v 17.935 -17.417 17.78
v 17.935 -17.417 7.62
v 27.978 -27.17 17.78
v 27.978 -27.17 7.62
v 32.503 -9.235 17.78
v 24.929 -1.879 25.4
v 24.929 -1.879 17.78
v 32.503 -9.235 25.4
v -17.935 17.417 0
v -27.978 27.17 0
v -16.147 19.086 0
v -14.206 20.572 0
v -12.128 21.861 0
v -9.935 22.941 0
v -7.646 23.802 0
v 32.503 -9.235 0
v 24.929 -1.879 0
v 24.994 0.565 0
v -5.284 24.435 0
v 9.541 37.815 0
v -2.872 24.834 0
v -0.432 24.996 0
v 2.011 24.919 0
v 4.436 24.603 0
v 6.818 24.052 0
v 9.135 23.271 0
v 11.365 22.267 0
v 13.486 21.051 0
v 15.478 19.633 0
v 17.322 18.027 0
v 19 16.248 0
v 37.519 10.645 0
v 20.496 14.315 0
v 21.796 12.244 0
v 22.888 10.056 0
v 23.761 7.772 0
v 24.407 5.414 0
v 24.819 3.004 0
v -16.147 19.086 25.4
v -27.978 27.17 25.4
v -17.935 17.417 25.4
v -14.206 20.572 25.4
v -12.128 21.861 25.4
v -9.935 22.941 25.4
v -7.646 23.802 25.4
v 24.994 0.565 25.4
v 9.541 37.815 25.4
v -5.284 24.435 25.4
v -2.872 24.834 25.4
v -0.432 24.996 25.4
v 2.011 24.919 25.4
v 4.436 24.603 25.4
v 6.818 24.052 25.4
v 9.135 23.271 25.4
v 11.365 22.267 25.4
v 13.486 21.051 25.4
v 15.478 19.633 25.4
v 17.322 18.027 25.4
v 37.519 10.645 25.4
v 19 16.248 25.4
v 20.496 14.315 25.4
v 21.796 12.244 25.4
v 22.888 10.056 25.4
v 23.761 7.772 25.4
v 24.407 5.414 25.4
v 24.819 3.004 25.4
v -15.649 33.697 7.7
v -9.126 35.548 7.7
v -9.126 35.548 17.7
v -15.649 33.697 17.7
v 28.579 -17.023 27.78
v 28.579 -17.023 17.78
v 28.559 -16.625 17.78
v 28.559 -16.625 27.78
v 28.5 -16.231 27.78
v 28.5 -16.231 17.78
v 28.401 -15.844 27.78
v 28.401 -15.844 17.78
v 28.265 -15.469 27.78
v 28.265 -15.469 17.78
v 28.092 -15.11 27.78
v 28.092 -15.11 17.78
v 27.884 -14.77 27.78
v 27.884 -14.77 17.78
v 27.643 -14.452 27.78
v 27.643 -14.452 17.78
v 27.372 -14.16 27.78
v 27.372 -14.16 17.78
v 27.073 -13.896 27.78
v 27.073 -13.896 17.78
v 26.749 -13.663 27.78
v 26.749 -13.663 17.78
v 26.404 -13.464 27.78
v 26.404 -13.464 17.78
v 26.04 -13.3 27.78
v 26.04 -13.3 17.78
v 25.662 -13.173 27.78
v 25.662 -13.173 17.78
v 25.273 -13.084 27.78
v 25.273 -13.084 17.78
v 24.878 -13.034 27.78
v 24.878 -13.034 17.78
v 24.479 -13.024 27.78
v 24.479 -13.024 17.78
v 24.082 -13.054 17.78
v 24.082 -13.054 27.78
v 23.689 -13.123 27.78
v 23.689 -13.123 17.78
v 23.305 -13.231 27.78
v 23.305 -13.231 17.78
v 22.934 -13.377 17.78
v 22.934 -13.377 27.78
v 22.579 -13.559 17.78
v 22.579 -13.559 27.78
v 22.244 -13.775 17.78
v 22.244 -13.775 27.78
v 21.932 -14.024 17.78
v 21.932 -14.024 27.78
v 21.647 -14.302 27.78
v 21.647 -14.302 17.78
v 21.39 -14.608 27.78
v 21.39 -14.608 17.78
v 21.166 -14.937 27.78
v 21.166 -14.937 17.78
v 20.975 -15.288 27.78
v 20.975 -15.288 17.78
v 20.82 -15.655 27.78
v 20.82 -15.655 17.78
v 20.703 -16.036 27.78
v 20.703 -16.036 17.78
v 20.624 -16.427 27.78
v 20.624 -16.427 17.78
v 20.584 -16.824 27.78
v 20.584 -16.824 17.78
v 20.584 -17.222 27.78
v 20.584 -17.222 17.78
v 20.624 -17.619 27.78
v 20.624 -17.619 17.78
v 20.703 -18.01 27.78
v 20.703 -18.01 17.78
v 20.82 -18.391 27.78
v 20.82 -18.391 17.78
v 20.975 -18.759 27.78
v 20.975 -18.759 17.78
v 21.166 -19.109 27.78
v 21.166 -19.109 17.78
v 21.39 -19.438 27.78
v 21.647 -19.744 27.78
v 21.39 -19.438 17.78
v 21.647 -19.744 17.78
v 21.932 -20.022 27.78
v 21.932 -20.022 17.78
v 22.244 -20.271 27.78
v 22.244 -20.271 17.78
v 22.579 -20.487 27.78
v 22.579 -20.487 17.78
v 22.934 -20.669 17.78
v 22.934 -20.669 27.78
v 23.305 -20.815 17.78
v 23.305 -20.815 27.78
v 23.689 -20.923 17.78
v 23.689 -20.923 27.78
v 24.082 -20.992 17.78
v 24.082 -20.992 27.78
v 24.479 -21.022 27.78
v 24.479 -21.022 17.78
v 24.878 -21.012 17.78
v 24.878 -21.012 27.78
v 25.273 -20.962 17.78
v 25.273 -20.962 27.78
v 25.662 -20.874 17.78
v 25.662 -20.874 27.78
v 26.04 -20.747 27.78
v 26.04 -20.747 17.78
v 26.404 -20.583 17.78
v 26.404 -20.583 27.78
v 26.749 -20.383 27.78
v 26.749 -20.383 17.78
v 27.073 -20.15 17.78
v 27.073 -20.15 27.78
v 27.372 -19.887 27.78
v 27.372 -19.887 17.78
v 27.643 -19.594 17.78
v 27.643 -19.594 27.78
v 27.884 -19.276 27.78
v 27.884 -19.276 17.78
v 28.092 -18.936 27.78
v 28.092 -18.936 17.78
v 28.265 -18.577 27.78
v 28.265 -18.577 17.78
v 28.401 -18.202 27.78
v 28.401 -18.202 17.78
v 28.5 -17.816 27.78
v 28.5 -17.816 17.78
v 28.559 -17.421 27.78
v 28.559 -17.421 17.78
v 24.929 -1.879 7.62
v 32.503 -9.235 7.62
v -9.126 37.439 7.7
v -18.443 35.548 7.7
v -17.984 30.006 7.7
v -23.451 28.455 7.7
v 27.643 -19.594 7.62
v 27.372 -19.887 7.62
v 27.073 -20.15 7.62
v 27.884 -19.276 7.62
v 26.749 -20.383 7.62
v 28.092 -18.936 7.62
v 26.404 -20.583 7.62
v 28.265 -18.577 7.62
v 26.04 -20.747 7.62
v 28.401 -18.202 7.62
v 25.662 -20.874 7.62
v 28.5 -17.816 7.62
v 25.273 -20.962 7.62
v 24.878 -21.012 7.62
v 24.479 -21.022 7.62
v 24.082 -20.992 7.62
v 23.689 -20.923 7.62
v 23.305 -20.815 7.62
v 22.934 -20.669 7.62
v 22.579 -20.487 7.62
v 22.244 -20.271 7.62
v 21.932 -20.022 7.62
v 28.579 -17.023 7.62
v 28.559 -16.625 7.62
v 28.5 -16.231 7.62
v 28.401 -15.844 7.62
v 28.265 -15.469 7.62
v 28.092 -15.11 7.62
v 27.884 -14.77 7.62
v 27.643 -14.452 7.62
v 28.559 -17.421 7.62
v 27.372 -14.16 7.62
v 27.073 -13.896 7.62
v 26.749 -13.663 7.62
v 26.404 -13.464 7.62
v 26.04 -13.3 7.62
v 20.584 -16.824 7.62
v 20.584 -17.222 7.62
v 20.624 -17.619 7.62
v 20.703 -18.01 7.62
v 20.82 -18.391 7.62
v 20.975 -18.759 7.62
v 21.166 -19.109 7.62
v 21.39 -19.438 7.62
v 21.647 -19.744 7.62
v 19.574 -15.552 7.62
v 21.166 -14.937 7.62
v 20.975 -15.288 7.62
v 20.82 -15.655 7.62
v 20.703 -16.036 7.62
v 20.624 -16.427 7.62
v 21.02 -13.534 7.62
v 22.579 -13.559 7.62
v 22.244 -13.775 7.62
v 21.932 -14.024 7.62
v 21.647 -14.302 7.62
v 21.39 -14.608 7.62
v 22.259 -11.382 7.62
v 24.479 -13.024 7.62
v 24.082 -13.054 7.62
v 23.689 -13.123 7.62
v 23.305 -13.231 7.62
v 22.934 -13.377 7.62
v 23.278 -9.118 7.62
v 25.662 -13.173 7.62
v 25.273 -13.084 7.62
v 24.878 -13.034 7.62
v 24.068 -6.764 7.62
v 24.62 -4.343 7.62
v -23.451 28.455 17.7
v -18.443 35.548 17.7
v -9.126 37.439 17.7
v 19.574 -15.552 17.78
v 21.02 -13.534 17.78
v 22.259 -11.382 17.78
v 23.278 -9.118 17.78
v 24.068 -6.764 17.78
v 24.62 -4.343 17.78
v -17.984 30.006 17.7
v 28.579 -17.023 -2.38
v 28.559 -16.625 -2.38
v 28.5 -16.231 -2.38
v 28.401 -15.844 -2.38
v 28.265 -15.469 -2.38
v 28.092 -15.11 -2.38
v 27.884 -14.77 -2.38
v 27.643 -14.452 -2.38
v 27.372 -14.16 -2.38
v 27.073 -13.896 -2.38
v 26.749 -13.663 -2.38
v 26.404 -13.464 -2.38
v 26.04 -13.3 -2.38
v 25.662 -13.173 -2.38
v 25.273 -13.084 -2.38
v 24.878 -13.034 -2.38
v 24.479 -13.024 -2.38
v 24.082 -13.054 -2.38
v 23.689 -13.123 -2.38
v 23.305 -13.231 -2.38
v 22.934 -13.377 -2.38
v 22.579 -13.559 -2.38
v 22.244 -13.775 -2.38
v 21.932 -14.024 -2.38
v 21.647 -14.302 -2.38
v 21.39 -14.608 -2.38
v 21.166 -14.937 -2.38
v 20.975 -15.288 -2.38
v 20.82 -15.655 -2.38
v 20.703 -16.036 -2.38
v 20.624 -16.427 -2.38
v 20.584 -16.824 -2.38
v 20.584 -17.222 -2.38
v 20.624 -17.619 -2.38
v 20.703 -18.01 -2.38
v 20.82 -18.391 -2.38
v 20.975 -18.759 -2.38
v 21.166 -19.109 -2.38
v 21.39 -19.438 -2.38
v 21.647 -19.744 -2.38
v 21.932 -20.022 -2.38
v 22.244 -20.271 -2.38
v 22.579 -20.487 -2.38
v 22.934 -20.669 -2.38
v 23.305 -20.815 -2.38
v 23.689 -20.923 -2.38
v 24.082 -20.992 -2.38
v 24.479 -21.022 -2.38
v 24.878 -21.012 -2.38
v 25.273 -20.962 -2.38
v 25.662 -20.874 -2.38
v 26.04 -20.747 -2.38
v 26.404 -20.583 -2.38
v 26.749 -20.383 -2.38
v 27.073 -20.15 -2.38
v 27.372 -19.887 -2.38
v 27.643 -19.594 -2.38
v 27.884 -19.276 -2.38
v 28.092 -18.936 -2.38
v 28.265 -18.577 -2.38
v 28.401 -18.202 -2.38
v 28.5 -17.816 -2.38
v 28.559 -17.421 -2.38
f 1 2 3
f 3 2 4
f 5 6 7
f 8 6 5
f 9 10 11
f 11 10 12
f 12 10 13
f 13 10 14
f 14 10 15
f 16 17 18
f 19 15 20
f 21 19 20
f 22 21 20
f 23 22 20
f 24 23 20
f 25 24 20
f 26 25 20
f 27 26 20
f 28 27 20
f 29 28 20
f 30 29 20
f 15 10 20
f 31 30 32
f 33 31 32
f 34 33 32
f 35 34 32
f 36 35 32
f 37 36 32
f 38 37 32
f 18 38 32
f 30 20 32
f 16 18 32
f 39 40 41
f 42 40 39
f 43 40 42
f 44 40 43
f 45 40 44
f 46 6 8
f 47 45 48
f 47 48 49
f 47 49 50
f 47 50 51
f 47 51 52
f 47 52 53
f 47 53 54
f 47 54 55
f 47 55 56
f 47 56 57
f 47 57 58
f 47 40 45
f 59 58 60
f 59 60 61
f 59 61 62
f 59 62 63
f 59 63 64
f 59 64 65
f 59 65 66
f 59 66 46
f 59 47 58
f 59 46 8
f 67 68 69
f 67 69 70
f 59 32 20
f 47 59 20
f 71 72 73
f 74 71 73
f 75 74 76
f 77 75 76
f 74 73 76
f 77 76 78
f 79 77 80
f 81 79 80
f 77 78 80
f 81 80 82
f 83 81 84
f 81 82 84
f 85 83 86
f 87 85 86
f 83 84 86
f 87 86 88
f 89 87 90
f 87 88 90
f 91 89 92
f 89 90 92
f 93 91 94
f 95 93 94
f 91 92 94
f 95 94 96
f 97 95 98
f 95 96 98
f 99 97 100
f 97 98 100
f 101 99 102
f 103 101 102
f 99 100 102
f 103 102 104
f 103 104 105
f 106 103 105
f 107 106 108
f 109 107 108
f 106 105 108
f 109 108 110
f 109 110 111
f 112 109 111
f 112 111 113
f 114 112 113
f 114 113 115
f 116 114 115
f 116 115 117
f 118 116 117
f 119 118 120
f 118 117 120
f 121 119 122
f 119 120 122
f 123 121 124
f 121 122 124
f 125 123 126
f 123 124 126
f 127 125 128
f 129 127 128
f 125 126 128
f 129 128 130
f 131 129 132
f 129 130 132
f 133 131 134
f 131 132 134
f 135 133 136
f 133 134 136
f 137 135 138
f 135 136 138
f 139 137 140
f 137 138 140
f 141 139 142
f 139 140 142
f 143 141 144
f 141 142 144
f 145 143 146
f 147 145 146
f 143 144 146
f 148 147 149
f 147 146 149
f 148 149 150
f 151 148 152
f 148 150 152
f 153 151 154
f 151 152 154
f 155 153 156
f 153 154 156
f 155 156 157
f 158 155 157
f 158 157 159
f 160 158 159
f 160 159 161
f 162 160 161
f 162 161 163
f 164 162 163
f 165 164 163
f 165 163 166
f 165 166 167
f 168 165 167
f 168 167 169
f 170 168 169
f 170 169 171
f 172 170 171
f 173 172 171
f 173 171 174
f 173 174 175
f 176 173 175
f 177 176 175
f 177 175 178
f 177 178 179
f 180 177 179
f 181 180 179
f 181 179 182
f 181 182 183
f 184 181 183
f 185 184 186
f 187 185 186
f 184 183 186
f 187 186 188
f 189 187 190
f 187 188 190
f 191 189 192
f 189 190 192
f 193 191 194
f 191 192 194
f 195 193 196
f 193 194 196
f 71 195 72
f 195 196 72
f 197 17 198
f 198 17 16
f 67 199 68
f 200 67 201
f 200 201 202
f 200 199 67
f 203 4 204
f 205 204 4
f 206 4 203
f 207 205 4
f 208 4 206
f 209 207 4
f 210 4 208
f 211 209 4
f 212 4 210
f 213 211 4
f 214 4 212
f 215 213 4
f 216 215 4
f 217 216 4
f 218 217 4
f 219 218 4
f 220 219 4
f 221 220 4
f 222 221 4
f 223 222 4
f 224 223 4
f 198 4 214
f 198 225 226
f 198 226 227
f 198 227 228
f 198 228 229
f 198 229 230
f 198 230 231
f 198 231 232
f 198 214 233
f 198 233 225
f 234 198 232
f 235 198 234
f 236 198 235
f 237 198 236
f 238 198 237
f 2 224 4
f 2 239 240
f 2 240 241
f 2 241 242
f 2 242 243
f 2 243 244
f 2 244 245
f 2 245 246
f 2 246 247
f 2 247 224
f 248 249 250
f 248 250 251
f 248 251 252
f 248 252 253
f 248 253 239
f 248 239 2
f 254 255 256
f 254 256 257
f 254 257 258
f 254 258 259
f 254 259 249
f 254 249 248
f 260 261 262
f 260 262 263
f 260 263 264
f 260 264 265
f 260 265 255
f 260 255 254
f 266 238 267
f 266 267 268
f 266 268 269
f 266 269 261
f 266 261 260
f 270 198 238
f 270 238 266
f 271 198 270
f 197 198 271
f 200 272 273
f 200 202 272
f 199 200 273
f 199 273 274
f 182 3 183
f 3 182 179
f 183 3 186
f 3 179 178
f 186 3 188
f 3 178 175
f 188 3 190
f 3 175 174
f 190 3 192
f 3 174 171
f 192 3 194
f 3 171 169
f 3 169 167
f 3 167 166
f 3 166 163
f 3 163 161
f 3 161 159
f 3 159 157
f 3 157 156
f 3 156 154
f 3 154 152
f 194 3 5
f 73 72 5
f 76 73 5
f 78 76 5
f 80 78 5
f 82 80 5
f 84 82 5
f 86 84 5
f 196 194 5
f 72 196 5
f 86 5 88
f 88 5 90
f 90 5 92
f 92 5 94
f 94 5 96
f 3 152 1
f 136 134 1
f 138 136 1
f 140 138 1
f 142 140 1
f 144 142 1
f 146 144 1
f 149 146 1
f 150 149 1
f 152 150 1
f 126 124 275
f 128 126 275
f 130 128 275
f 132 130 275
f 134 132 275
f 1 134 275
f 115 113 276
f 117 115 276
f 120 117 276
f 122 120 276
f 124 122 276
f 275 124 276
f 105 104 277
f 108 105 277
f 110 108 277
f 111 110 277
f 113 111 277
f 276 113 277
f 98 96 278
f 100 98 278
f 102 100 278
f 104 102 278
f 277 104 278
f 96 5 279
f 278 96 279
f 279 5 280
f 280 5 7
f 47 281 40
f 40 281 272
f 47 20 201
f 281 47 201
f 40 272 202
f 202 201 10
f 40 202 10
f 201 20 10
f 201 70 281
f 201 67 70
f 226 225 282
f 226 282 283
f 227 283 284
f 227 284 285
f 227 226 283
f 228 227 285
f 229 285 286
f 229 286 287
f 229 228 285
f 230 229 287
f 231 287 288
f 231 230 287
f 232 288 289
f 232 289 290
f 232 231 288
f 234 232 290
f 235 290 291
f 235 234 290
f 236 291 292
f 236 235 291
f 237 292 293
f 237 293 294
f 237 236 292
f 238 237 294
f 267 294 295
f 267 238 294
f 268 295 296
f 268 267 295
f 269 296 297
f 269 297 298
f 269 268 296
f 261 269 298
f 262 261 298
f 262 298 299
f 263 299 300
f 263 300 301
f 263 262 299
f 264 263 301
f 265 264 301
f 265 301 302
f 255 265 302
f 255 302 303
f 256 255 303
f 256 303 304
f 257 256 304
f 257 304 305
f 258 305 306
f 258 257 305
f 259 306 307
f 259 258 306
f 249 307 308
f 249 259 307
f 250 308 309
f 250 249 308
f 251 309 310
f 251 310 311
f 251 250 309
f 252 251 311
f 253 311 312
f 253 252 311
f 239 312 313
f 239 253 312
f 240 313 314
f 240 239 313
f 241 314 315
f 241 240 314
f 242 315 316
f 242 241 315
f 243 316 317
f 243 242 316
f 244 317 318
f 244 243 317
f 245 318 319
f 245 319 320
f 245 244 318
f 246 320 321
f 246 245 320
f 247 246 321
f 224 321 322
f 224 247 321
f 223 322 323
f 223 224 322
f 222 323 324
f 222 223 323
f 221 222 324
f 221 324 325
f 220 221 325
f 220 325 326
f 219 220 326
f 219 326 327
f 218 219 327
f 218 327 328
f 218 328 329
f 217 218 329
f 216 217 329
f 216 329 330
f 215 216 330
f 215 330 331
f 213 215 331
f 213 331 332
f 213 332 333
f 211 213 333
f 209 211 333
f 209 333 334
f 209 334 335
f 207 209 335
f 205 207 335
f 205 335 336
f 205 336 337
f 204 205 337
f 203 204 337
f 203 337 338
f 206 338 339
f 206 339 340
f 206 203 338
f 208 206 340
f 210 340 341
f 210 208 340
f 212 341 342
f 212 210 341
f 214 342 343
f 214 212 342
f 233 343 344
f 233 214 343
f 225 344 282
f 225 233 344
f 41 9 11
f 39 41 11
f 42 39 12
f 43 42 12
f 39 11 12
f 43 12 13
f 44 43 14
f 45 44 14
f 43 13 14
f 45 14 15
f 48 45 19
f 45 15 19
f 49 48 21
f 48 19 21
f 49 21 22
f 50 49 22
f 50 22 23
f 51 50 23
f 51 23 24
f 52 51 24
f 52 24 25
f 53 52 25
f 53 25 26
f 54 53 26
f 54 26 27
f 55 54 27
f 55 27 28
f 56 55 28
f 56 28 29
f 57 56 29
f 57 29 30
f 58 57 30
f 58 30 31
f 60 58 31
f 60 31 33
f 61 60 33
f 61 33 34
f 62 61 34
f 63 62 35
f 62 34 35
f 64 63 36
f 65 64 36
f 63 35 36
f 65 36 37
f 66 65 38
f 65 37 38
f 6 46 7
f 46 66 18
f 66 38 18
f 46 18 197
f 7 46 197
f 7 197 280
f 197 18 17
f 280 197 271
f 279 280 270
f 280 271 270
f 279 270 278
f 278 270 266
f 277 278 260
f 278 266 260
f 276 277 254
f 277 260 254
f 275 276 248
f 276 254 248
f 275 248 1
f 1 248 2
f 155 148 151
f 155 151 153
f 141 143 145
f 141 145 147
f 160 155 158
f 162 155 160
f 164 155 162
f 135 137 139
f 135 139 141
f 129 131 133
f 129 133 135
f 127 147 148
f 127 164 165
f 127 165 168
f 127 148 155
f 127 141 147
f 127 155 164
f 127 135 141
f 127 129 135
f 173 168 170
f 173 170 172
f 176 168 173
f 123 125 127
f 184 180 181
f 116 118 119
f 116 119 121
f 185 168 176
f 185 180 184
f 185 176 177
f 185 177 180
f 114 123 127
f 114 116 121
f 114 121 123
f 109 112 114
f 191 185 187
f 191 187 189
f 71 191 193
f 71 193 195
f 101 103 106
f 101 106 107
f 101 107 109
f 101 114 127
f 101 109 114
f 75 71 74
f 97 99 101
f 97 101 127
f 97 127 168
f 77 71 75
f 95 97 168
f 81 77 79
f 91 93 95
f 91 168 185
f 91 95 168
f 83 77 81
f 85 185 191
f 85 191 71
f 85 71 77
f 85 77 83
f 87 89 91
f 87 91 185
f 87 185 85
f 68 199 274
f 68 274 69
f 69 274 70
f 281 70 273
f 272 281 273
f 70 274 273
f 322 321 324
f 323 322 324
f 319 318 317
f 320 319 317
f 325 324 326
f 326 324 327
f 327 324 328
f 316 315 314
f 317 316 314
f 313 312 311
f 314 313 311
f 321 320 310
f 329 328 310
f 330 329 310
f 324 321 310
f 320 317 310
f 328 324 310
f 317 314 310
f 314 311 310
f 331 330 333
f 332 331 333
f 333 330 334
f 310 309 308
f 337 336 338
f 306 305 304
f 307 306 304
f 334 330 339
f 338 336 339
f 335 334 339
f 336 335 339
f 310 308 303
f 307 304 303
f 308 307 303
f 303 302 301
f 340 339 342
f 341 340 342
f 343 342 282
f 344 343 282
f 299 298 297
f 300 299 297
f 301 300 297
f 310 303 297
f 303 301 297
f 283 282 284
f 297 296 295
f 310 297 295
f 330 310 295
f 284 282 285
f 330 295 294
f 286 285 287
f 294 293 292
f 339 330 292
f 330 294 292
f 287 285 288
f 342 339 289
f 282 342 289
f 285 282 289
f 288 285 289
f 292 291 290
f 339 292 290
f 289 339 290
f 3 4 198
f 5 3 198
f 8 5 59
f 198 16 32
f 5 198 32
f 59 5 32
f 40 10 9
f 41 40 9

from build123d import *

# Parameters (mm, degrees)
BOSS_EXTRUDE1_DEPTH = 25.4
CUT_EXTRUDE1_DEPTH  = 7.62
SKETCH3_R           = 4
BOSS_EXTRUDE2_DEPTH = 10
BOSS_EXTRUDE3_DEPTH = 5


with BuildPart() as part:
    # Sketch1 → Boss-Extrude1 (new body)
    with BuildSketch(Plane.XY):
        with BuildLine():
            Line((9.541145468, 37.814898429), (-27.978089947, 27.17032357))
            Line((-27.978089947, 27.17032357), (-17.934673043, 17.416874084))
            ThreePointArc((-17.934673043, 17.416874084), (17.416874084, 17.934673043), (17.934673043, -17.416874084))
            Line((17.934673043, -17.416874084), (27.978089947, -27.17032357))
            Line((27.978089947, -27.17032357), (37.519235415, 10.644574858))
            Line((37.519235415, 10.644574858), (9.541145468, 37.814898429))
        make_face()
    extrude(amount=BOSS_EXTRUDE1_DEPTH)

    # Sketch2 → Cut-Extrude1 (cut)
    with BuildSketch(Plane.XY.offset(25.4)):
        Polygon((21.419411921, 1.52926165), (45.089583043, -21.457518704), (5.352657375, -38.695482799), align=None)
    cut_extrude1 = extrude(amount=-CUT_EXTRUDE1_DEPTH, mode=Mode.SUBTRACT)

    # Sketch3 → Boss-Extrude2 (add)
    with BuildSketch(Plane.XY.offset(17.78)):
        with Locations((24.578895169, -17.023104028)):
            Circle(SKETCH3_R)
    boss_extrude2 = extrude(amount=BOSS_EXTRUDE2_DEPTH)

    # Mirror1: Cut-Extrude1, Boss-Extrude2 across plane
    add(cut_extrude1.mirror(Plane(origin=(0, 0, 12.7), x_dir=(1, 0, 0), z_dir=(0, 0, -1))), mode=Mode.SUBTRACT)
    add(boss_extrude2.mirror(Plane(origin=(0, 0, 12.7), x_dir=(1, 0, 0), z_dir=(0, 0, -1))))

    # Sketch4 → Boss-Extrude3 (add, symmetric)
    with BuildSketch(Plane(origin=(0, 0, 12.7), x_dir=(-1, 0, 0), z_dir=(0, 0, -1))):
        Polygon((23.45113357, 28.454665469), (18.442827964, 35.547681457), (9.125788769, 37.439046087), (9.125788769, 35.547681457), (15.649252306, 33.696910907), (17.983802714, 30.005800825), align=None)
    extrude(amount=BOSS_EXTRUDE3_DEPTH, both=True)


solid = part.part
